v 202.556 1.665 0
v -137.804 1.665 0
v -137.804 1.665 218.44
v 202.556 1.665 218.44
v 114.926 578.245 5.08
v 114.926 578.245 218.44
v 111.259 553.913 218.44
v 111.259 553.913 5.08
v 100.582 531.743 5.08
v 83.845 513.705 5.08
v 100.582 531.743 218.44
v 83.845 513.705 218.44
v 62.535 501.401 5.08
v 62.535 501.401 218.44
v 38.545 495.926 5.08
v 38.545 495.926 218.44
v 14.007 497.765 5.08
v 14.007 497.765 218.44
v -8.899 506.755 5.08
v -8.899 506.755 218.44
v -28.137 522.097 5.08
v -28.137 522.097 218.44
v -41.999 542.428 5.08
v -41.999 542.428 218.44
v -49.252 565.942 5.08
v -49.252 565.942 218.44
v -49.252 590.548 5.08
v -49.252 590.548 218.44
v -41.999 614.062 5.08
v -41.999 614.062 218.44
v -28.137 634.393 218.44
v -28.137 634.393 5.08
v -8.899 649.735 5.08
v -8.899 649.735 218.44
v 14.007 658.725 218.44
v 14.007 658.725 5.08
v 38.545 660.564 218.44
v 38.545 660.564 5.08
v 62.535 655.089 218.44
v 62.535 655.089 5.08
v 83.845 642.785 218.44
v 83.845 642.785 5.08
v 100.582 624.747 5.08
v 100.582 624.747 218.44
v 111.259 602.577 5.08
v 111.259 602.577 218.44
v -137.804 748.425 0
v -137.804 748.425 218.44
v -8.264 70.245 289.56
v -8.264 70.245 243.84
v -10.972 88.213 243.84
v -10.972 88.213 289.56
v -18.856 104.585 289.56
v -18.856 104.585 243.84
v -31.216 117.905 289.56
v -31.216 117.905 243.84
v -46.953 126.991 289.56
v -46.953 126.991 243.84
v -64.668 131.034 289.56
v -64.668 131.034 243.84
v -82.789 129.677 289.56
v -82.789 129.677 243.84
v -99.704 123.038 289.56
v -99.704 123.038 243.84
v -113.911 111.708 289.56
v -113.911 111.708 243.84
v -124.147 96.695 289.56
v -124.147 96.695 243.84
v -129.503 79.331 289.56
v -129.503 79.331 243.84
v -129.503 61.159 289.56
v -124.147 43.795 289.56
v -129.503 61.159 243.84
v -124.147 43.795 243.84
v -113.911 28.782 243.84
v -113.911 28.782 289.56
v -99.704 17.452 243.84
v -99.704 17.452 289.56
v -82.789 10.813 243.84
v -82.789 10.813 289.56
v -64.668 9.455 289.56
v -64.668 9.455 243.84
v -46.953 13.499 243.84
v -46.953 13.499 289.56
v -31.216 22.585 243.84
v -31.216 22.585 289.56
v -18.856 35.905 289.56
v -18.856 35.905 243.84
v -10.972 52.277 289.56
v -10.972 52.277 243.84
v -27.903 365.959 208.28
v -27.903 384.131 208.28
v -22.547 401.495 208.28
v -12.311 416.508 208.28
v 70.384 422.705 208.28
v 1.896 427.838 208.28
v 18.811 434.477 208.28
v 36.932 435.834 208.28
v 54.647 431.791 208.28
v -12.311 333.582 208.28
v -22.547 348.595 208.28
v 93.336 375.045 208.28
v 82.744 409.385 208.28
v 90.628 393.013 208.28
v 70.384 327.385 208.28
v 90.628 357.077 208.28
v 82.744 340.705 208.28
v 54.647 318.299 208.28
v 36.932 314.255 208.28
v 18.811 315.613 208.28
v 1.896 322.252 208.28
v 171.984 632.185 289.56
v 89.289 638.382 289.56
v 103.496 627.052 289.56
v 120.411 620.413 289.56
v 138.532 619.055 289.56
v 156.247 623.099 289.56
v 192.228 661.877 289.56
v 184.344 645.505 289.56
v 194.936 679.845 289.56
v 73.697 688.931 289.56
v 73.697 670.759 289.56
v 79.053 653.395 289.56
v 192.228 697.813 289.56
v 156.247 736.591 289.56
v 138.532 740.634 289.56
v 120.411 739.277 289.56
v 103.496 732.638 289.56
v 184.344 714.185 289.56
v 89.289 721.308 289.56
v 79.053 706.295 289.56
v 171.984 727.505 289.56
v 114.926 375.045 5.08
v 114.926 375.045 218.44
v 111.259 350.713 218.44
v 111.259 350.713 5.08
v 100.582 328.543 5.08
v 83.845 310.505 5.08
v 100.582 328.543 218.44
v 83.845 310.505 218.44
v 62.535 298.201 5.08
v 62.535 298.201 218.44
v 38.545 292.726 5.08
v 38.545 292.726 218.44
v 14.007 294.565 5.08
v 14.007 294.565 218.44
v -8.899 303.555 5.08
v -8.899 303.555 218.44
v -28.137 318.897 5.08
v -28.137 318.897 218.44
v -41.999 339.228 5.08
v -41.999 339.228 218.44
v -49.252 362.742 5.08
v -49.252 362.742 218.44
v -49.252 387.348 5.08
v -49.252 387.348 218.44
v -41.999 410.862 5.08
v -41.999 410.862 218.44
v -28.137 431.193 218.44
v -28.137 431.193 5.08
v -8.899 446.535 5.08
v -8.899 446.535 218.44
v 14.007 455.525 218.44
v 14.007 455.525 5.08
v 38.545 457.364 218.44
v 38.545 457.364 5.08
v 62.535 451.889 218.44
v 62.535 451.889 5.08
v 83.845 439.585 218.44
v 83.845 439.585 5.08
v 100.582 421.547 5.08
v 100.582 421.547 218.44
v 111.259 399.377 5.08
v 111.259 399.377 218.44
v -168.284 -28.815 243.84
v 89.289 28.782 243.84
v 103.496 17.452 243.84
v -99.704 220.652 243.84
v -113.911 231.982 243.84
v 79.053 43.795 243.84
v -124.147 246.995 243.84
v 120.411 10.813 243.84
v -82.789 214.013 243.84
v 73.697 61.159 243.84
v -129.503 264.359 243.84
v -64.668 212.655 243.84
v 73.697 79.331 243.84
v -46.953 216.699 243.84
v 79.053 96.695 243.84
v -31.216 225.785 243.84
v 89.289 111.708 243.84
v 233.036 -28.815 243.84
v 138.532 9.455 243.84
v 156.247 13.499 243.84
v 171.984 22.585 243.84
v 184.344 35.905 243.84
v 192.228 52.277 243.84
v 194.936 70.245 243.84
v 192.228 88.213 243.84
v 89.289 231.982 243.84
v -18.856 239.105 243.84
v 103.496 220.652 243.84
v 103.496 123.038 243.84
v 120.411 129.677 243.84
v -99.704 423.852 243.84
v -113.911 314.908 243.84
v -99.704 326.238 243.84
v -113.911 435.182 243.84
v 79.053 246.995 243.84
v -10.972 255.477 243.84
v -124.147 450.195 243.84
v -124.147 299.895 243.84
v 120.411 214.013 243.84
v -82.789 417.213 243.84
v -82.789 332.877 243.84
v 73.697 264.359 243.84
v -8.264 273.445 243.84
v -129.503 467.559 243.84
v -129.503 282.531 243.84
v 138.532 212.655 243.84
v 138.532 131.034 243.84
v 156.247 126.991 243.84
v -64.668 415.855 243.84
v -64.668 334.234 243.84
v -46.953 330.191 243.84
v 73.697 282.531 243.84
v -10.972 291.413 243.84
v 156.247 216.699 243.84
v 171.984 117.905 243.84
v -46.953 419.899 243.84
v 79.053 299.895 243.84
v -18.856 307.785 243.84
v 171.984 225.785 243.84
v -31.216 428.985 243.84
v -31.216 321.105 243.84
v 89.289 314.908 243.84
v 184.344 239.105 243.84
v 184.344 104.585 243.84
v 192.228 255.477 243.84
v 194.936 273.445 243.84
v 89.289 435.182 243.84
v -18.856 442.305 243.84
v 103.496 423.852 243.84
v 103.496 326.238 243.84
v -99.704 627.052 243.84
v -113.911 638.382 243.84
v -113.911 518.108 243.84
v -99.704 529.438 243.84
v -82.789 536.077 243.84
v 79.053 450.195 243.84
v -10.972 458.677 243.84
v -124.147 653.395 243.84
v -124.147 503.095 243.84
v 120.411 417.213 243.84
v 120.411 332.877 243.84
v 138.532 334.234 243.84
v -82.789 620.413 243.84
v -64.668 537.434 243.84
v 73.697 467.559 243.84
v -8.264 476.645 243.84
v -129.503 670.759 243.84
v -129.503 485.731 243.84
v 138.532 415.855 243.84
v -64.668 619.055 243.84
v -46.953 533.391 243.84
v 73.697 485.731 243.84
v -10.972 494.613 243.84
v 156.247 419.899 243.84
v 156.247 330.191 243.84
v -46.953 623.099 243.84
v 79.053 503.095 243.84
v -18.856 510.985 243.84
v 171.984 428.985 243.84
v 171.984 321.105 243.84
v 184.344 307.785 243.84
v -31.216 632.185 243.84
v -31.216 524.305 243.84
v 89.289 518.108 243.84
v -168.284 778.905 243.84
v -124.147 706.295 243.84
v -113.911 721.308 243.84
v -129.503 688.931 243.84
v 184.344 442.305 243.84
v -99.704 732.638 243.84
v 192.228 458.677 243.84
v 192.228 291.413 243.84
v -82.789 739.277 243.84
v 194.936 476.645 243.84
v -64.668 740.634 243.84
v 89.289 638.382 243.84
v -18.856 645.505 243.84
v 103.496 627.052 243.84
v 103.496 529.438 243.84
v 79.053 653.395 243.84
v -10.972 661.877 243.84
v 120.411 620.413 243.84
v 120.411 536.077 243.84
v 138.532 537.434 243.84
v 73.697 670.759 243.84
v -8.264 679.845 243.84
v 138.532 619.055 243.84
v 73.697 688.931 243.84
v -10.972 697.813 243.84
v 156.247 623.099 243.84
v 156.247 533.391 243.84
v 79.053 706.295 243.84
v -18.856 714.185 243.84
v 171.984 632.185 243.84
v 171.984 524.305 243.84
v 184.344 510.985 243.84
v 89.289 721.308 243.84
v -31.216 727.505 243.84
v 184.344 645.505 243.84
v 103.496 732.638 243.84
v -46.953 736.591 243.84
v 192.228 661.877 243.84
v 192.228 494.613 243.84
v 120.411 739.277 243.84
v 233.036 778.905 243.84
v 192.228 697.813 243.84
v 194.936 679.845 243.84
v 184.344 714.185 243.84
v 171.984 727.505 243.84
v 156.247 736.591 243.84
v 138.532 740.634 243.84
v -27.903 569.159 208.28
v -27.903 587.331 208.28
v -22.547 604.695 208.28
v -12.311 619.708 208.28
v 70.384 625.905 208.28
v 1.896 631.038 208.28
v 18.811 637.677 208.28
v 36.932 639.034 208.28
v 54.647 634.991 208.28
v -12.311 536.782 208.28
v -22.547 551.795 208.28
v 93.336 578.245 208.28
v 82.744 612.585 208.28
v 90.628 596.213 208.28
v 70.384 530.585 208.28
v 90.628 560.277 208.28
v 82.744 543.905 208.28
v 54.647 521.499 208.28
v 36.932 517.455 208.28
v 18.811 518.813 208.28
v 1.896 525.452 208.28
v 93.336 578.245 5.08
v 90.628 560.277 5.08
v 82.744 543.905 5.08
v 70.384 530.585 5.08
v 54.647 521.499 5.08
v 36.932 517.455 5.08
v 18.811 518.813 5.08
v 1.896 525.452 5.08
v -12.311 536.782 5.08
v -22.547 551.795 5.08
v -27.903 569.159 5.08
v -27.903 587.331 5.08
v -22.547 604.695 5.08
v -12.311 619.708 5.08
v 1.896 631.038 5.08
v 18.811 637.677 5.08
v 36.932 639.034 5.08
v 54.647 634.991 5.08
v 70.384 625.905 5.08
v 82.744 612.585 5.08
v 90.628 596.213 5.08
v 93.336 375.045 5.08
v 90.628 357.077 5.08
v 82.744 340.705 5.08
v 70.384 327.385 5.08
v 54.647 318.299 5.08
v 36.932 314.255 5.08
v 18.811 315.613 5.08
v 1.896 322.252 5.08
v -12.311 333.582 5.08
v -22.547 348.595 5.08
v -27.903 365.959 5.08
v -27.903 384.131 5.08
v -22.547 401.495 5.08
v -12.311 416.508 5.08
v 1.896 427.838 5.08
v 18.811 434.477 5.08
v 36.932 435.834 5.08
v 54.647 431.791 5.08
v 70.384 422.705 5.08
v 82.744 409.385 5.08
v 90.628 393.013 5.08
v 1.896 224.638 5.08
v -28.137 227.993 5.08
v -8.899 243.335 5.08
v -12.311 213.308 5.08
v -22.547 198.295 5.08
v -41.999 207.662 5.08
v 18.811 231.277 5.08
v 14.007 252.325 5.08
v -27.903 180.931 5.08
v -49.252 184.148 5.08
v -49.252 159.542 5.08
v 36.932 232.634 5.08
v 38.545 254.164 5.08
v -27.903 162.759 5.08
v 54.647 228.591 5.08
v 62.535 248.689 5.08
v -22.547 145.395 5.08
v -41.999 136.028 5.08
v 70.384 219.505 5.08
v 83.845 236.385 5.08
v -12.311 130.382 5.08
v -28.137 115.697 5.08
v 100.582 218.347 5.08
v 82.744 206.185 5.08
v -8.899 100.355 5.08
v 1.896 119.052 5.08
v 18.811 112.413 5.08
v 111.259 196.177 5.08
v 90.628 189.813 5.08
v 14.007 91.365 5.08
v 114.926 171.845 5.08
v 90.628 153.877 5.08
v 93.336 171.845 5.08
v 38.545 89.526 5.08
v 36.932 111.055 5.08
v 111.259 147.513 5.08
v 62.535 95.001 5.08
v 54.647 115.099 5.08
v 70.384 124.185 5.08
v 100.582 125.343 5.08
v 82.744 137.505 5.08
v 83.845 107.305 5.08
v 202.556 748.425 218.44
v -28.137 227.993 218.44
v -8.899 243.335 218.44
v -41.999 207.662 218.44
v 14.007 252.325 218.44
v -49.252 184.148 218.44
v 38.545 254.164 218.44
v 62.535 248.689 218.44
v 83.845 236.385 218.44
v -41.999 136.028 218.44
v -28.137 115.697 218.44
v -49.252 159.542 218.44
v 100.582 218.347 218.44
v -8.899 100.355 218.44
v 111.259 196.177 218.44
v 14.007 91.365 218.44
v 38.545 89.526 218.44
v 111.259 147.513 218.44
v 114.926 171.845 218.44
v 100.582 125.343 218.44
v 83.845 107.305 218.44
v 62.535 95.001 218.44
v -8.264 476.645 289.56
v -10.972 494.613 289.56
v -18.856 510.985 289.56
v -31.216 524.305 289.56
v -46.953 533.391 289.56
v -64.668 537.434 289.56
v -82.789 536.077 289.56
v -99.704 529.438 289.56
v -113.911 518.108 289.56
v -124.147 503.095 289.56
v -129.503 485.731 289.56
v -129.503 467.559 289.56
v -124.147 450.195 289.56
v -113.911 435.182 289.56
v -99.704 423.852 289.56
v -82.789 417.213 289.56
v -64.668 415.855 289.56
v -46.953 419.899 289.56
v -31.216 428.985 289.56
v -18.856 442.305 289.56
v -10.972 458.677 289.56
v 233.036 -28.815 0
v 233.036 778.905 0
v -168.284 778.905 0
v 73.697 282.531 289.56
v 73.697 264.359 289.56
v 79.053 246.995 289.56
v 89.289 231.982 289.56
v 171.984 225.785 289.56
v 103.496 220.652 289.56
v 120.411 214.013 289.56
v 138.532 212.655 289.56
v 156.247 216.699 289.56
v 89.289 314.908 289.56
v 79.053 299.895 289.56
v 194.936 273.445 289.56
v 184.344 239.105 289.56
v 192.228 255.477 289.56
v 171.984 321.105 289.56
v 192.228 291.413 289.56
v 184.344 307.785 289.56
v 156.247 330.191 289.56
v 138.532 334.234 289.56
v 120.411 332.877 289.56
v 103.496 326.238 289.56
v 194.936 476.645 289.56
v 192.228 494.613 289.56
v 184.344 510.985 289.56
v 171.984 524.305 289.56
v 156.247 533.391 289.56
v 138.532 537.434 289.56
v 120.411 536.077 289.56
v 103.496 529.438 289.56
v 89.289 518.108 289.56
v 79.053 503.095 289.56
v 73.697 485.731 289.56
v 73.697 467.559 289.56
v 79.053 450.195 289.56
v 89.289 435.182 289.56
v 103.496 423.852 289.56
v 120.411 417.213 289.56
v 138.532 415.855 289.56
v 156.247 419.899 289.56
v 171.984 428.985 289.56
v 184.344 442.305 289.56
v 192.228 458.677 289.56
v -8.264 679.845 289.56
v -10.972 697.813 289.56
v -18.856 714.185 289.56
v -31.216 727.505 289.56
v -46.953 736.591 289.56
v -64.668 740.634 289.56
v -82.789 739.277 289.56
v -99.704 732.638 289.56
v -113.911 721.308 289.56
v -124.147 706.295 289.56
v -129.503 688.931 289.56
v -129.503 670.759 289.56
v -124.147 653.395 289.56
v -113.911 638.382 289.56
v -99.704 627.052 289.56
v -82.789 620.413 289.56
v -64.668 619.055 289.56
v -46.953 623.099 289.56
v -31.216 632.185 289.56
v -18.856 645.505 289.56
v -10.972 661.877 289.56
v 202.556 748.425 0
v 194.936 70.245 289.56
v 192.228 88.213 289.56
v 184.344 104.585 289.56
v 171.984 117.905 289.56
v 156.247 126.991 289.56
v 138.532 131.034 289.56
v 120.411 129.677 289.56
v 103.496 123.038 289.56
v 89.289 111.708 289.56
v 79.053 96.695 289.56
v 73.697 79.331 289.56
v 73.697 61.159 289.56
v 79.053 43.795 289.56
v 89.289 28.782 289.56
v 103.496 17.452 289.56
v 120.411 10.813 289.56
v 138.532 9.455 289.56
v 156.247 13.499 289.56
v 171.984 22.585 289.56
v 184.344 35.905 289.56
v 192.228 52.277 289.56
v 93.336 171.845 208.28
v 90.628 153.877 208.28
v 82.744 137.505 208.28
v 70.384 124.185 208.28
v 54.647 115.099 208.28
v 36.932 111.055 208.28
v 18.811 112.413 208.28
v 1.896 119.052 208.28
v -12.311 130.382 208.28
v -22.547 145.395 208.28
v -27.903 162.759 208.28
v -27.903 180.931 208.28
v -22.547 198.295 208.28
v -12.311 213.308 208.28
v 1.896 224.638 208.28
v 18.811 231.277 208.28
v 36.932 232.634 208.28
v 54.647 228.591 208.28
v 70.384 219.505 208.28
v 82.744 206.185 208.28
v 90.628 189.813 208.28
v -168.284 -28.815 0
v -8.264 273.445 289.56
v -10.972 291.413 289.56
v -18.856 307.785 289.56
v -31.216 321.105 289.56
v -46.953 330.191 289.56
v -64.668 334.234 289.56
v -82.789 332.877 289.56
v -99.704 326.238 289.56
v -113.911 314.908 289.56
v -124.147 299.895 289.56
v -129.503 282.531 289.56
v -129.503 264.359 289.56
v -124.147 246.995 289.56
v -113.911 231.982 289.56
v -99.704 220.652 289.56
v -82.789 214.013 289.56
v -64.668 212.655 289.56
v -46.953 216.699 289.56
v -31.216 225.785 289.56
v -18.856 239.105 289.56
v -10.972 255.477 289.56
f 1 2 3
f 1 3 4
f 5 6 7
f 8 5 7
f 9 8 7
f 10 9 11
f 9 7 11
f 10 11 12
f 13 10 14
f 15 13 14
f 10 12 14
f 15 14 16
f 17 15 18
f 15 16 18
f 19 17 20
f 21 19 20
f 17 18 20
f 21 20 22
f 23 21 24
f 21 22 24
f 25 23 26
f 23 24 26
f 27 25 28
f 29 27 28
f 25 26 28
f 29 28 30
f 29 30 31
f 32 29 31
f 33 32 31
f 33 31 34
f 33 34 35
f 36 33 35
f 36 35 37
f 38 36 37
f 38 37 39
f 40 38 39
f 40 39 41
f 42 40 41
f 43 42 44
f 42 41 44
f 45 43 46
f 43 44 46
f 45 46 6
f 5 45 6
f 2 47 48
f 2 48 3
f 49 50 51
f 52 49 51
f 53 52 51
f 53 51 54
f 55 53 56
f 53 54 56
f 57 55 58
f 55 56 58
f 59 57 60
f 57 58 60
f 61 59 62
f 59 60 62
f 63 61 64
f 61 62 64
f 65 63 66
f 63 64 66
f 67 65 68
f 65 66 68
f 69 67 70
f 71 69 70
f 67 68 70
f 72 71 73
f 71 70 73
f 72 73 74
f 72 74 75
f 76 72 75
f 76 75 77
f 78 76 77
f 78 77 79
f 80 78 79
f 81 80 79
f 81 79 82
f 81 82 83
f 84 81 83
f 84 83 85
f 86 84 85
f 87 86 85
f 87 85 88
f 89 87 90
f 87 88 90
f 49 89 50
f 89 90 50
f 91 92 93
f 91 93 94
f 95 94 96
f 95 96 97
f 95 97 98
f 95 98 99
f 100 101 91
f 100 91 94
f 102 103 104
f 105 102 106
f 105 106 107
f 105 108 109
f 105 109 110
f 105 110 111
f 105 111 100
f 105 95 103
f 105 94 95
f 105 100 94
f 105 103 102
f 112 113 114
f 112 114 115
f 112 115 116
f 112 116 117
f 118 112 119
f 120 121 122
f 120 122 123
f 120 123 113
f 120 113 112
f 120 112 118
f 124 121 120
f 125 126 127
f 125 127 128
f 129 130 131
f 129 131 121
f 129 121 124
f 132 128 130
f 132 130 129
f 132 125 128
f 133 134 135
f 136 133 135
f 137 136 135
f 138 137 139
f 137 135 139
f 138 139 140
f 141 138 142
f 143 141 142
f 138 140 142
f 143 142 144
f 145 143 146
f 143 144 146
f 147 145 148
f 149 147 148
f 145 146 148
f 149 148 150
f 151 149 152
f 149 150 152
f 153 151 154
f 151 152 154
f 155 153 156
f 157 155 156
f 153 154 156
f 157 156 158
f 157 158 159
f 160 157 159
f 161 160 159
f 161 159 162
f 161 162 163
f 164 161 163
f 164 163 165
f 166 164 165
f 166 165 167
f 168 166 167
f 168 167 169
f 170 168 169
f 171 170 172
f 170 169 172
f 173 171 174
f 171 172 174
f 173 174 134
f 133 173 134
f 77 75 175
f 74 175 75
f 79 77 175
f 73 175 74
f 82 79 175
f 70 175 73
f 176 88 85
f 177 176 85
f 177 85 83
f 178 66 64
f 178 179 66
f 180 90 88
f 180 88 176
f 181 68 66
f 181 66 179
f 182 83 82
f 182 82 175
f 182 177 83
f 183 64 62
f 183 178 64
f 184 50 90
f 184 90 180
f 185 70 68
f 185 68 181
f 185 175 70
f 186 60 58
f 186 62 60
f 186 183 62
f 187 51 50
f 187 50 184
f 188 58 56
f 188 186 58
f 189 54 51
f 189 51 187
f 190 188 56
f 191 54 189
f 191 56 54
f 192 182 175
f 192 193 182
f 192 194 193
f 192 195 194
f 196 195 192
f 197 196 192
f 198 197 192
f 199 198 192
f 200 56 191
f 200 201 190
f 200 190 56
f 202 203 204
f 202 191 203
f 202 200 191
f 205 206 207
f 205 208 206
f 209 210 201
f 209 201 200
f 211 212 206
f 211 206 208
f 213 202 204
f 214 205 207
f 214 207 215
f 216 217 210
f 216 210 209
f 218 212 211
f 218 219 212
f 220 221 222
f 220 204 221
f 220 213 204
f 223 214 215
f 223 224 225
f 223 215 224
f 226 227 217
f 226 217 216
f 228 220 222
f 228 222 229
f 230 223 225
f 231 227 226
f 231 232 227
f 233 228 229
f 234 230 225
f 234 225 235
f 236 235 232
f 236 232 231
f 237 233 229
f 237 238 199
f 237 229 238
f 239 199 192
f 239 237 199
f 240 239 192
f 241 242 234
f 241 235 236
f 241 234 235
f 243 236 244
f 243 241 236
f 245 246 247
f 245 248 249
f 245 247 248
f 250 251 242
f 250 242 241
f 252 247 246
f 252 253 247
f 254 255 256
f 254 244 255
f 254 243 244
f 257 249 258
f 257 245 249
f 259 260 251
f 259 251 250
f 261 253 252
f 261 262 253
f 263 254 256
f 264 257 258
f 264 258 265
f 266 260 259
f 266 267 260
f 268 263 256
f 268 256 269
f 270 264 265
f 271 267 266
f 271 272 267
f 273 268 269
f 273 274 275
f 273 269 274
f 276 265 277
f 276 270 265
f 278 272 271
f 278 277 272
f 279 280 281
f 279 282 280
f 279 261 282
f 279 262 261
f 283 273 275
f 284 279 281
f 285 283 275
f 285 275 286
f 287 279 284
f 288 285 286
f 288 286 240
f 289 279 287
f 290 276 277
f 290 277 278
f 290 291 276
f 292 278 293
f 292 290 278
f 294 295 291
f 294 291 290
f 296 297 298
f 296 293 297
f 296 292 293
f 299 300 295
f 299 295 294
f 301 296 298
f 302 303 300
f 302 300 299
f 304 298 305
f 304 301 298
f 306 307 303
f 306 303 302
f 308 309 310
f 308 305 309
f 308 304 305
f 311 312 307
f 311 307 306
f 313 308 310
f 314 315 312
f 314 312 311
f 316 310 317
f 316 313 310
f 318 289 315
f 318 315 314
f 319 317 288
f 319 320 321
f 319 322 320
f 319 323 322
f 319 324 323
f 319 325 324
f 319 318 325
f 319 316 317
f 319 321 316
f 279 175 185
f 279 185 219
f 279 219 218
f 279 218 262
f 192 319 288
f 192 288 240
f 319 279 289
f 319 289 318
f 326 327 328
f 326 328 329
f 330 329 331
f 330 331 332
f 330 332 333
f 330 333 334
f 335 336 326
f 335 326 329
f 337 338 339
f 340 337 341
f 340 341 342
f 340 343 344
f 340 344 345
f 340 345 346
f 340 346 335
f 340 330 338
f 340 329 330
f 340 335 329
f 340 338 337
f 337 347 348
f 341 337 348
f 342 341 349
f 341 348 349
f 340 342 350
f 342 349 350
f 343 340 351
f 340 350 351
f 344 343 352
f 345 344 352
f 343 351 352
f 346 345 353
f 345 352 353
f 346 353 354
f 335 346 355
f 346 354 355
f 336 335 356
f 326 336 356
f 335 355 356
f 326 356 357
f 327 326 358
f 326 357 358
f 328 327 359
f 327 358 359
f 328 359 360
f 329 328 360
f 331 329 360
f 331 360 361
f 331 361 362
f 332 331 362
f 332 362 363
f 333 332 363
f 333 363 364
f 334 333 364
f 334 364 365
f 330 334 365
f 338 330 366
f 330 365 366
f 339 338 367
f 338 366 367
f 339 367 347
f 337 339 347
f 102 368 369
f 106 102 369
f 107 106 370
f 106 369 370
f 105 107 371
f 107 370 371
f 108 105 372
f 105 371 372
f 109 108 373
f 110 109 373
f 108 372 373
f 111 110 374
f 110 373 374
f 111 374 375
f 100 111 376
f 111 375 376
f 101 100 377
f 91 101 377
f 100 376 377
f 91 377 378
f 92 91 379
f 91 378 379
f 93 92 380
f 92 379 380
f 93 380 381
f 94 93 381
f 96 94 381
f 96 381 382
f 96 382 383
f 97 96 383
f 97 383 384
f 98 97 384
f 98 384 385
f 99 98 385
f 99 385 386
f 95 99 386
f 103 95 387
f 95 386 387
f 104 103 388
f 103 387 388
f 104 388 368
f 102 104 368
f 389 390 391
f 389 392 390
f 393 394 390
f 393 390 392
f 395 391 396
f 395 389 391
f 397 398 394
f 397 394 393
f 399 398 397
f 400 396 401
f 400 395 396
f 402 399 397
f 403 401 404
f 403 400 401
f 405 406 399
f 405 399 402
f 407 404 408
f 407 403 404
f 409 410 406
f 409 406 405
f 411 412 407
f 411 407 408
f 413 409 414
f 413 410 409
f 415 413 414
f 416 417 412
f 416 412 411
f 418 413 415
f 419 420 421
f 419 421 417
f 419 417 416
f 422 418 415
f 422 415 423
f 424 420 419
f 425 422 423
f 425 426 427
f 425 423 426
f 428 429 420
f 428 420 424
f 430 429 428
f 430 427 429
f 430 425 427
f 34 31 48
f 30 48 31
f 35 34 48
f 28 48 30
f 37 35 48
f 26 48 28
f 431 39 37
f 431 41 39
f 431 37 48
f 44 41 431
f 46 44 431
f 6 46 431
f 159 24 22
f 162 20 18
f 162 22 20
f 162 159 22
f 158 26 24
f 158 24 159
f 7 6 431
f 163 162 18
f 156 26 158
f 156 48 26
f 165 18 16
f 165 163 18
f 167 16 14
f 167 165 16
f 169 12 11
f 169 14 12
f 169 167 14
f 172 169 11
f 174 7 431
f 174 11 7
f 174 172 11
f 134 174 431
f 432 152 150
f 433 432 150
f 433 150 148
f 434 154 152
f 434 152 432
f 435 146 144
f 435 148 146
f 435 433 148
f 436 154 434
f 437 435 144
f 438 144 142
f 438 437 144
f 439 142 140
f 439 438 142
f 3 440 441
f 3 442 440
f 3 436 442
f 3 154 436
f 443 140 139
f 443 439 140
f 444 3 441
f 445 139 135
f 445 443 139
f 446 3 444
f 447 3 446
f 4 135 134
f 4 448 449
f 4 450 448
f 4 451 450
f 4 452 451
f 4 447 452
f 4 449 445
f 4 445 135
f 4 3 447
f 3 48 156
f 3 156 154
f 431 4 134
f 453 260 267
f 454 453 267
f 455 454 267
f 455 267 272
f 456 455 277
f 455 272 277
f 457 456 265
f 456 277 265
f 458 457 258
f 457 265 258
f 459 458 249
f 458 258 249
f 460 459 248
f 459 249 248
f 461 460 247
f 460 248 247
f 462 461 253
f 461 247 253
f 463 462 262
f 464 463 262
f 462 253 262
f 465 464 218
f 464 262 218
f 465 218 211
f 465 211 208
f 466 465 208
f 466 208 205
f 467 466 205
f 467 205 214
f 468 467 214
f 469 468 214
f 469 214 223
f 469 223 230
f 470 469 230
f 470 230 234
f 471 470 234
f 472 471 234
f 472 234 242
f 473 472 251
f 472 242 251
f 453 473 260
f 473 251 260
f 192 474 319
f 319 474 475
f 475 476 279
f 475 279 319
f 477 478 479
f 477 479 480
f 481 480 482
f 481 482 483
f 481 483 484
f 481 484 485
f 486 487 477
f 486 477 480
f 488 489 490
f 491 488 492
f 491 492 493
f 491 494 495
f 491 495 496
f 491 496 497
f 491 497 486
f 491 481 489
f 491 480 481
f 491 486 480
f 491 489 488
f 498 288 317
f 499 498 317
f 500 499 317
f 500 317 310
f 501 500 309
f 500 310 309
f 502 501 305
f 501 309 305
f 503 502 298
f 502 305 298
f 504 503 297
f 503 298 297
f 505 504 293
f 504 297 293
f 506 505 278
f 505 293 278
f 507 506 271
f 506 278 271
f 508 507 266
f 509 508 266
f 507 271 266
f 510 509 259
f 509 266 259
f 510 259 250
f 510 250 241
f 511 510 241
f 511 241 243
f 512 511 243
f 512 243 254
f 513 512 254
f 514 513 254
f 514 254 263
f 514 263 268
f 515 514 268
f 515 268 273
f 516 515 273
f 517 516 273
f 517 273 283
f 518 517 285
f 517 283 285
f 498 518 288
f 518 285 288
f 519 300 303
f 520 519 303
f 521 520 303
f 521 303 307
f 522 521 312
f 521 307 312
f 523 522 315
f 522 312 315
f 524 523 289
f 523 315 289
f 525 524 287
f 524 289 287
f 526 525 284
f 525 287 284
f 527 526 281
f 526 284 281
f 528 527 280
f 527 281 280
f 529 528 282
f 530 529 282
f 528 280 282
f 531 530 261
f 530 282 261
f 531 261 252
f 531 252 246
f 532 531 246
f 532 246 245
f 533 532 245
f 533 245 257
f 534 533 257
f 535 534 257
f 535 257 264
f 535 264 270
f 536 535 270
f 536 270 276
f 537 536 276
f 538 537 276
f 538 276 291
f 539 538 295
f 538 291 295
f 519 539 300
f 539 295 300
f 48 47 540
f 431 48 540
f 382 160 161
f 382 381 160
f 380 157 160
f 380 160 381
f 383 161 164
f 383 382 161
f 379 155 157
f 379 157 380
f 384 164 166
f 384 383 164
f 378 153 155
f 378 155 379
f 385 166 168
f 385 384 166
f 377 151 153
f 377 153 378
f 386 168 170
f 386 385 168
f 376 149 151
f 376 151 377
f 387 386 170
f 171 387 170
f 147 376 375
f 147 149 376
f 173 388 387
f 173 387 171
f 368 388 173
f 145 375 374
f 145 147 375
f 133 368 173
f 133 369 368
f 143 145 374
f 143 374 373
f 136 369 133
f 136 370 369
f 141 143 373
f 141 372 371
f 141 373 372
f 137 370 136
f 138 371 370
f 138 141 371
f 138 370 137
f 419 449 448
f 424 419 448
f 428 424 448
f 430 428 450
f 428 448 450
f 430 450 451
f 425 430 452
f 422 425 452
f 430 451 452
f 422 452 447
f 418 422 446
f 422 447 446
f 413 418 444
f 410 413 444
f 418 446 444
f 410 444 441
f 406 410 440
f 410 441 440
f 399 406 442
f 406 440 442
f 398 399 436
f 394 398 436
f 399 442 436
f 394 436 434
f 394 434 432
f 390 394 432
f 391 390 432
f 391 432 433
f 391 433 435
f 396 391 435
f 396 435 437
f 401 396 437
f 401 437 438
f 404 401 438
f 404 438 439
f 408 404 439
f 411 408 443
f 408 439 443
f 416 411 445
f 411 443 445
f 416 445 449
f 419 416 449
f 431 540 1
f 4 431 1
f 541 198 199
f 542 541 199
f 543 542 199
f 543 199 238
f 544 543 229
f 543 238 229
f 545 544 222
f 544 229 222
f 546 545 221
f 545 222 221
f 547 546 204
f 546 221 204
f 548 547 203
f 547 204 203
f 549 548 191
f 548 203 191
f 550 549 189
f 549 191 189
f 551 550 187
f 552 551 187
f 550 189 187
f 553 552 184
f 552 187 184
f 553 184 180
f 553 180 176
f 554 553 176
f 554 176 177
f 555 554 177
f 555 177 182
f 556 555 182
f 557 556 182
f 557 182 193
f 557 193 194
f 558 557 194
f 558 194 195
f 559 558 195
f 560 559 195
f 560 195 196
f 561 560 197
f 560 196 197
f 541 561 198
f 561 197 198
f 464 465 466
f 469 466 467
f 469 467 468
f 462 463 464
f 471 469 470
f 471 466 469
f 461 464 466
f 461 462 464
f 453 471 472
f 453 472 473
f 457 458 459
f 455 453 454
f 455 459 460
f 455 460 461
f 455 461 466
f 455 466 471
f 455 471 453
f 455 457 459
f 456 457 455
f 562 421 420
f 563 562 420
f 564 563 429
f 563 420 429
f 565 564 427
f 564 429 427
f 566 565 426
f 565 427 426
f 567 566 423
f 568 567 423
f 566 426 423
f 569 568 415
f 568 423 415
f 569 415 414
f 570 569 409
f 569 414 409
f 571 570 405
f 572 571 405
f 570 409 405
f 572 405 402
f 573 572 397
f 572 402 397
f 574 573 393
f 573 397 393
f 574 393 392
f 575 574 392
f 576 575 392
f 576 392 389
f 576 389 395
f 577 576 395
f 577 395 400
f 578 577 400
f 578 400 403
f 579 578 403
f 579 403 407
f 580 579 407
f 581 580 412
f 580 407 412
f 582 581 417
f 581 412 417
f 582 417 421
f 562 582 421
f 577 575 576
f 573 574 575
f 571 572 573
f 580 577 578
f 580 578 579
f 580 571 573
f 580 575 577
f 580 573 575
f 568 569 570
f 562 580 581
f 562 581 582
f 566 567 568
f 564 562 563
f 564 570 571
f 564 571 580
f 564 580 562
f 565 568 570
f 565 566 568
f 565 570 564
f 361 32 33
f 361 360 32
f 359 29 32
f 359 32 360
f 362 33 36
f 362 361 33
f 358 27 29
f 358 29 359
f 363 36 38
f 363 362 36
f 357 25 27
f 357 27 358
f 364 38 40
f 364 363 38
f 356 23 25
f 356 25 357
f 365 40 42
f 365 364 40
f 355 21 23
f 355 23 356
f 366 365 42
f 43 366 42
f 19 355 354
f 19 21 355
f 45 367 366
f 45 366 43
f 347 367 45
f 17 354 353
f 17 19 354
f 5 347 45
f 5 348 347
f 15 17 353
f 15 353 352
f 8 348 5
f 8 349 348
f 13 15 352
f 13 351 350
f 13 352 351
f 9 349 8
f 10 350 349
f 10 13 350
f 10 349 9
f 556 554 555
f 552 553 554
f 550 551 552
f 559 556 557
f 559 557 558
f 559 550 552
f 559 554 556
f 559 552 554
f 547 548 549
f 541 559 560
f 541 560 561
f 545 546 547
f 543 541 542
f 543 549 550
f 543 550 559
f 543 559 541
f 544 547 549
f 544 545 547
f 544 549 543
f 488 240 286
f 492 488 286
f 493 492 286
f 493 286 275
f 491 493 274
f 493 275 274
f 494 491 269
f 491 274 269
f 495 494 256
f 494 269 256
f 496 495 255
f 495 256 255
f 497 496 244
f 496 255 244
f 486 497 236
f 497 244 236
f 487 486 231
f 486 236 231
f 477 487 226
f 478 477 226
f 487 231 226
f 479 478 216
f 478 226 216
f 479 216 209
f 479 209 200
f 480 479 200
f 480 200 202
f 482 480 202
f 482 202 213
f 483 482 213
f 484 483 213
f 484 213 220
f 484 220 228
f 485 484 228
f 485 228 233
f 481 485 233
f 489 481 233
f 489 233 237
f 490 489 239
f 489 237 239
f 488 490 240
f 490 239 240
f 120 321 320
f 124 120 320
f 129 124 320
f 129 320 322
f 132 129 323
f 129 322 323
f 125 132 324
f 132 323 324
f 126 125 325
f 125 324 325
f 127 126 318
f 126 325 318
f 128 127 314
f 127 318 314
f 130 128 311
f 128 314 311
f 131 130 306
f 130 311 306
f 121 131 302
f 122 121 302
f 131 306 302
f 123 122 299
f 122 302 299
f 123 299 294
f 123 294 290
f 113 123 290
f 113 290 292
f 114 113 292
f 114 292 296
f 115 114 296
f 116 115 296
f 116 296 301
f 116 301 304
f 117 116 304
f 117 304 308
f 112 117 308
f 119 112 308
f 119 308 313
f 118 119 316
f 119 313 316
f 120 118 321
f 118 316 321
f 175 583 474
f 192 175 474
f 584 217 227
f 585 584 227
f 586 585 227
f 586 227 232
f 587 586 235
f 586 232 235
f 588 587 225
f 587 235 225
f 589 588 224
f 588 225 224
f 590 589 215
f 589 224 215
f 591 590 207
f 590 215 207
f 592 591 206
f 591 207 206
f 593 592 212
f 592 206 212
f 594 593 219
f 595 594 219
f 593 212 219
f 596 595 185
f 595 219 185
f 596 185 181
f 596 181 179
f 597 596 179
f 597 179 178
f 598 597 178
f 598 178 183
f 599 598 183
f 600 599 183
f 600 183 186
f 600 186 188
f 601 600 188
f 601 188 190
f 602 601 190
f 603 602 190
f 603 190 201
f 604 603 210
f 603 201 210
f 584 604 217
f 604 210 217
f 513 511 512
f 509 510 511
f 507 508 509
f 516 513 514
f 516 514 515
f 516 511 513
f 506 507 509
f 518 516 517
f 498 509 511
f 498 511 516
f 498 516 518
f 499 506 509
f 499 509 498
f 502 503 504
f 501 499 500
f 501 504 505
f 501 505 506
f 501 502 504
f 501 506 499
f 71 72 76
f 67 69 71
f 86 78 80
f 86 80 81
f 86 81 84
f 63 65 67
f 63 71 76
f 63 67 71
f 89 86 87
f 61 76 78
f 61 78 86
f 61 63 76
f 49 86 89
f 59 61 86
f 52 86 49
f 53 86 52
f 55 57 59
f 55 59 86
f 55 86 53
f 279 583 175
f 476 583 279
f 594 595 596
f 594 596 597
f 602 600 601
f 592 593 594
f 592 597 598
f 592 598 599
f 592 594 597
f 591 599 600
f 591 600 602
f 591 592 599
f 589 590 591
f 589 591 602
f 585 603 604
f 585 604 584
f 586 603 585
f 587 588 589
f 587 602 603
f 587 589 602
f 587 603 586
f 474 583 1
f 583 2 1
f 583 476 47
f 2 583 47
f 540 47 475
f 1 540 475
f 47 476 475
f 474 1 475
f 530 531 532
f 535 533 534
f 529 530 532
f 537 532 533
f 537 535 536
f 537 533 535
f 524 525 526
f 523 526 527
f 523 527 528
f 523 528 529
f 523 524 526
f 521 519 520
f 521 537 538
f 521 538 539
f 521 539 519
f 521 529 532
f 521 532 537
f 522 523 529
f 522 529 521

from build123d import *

# Parameters (mm, degrees)
F0_W     = 401.32
F0_H     = 807.72
F1_DEPTH = 243.84
F2_R     = 60.96
F3_DEPTH = 45.72
F4_W     = 340.36
F4_H     = 746.76
F5_DEPTH = 218.44
F6_R     = 82.55
F7_DEPTH = 213.36
F8_R     = 60.96
F9_DEPTH = 203.2


with BuildPart() as f1:
    # F0 (on Top) → F1 (new body)
    with BuildSketch(Plane.XY):
        with Locations((32.376148, 375.04495)):
            Rectangle(F0_W, F0_H)
    extrude(amount=F1_DEPTH)

    # F2 (on face) → F3 (join)
    with BuildSketch(Plane.XY.offset(243.84)):
        with Locations((-69.223852, 70.24495)):
            Circle(F2_R)
        with Locations((-69.223852, 273.44495)):
            Circle(F2_R)
        with Locations((-69.223852, 476.64495)):
            Circle(F2_R)
        with Locations((-69.223852, 679.84495)):
            Circle(F2_R)
        with Locations((133.976148, 70.24495)):
            Circle(F2_R)
        with Locations((133.976148, 273.44495)):
            Circle(F2_R)
        with Locations((133.976148, 476.64495)):
            Circle(F2_R)
        with Locations((133.976148, 679.84495)):
            Circle(F2_R)
    extrude(amount=F3_DEPTH)

    # F4 (on face) → F5 (cut)
    with BuildSketch(Plane(origin=(0, 0, 0), x_dir=(1, 0, 0), z_dir=(0, 0, -1))):
        with Locations((32.376148, -375.04495)):
            Rectangle(F4_W, F4_H)
    extrude(amount=-F5_DEPTH, mode=Mode.SUBTRACT)

    # F6 (on face) → F7 (join)
    with BuildSketch(Plane(origin=(0, 0, 218.44), x_dir=(1, 0, 0), z_dir=(0, 0, -1))):
        with Locations((32.376148, -578.24495)):
            Circle(F6_R)
        with Locations((32.376148, -375.04495)):
            Circle(F6_R)
        with Locations((32.376148, -171.84495)):
            Circle(F6_R)
    extrude(amount=F7_DEPTH)

    # F8 (on face) → F9 (cut)
    with BuildSketch(Plane(origin=(0, 0, 5.08), x_dir=(1, 0, 0), z_dir=(0, 0, -1))):
        with Locations((32.376148, -171.84495)):
            Circle(F8_R)
        with Locations((32.376148, -375.04495)):
            Circle(F8_R)
        with Locations((32.376148, -578.24495)):
            Circle(F8_R)
    extrude(amount=-F9_DEPTH, mode=Mode.SUBTRACT)


solid = f1.part
